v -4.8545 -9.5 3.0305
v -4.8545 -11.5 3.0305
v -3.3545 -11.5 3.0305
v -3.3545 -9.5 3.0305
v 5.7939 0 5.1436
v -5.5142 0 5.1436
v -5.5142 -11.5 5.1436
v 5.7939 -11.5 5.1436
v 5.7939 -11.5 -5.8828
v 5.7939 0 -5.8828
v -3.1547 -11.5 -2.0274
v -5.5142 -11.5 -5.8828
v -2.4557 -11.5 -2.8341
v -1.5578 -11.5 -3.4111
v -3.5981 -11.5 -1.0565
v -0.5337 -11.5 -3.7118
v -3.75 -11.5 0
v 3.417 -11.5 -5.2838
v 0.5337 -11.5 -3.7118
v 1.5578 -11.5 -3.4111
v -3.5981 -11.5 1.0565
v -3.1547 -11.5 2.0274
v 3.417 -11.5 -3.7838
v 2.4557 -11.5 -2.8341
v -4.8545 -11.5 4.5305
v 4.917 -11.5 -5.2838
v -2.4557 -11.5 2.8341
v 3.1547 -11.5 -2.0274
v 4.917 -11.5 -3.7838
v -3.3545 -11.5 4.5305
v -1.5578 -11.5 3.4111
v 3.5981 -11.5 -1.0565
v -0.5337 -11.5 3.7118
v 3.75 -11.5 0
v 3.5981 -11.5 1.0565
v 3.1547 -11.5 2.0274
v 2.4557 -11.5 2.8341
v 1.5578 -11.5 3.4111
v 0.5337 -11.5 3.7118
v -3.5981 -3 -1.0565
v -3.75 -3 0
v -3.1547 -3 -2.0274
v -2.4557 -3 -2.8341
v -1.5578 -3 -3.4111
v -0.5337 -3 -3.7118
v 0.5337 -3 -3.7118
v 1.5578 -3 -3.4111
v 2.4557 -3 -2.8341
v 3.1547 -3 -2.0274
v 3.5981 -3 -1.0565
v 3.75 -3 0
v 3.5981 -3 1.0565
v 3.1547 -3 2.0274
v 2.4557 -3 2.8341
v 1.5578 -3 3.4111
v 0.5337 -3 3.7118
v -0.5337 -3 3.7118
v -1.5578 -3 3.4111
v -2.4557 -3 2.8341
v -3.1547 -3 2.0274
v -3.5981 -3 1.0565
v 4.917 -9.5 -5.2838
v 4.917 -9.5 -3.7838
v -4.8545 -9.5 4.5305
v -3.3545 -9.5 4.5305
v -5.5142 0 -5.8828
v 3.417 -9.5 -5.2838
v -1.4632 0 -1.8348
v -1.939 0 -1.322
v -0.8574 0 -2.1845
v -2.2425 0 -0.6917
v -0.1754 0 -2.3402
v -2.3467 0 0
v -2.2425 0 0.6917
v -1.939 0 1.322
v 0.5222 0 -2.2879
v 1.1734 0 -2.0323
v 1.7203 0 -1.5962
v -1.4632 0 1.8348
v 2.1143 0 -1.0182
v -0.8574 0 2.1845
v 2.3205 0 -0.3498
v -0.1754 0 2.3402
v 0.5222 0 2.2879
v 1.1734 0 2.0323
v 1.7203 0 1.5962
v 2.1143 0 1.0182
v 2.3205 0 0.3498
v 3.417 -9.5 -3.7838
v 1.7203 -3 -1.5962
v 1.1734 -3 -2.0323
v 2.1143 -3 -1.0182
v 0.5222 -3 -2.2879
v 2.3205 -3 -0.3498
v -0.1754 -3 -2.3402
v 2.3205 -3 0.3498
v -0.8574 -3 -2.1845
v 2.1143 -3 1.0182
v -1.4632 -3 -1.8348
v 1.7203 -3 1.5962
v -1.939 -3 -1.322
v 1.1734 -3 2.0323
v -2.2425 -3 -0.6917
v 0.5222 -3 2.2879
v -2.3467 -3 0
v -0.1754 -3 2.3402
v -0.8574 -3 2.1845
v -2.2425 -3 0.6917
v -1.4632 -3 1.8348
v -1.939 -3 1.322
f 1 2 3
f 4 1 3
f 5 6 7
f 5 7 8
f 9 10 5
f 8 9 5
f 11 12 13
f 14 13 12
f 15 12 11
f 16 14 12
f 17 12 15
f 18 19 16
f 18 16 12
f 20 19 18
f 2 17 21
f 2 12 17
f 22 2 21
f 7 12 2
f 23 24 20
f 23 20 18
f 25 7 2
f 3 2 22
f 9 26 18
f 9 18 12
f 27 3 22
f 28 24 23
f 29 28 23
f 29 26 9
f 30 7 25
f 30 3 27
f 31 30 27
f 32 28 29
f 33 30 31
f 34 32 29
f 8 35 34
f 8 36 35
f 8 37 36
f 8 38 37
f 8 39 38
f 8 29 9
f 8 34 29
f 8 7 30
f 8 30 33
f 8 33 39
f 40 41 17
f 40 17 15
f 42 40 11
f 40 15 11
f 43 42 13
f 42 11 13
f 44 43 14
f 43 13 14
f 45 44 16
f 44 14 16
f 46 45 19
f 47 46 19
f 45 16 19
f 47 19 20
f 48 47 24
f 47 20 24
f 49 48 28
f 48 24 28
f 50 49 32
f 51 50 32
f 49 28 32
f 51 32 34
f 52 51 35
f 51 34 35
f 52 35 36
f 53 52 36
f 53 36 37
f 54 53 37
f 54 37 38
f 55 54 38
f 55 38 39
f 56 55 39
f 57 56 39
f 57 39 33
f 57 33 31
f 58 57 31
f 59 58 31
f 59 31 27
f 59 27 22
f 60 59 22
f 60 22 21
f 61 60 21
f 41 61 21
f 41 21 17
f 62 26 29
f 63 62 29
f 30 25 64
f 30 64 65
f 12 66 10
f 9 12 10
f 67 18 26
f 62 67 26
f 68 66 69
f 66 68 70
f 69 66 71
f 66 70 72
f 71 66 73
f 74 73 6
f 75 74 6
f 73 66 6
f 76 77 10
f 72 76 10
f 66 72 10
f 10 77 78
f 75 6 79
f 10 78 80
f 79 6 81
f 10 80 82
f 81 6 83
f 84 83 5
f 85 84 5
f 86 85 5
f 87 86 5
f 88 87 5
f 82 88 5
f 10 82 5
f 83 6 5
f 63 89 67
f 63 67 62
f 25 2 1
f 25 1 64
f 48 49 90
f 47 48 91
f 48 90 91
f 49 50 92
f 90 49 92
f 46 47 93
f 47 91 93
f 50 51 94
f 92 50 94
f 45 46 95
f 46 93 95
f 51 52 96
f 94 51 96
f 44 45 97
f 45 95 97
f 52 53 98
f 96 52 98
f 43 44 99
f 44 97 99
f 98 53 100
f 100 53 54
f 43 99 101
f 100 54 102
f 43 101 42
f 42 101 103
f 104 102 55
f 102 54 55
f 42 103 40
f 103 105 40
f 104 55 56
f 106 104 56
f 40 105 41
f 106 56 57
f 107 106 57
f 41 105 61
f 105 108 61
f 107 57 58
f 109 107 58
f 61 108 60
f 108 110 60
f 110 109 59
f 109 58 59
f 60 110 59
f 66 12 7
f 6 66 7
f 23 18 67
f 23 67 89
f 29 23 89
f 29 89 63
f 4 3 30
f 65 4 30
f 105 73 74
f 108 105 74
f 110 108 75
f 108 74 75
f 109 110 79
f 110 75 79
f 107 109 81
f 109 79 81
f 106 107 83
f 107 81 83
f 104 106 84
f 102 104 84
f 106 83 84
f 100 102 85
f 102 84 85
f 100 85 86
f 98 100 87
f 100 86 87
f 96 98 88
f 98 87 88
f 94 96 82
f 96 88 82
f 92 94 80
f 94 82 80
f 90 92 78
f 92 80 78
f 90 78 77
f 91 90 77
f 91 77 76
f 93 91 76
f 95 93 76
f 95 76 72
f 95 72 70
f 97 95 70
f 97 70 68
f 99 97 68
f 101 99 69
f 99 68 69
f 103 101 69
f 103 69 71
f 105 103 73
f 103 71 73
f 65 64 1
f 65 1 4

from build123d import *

# Parameters (mm, degrees)
F0_W      = 15.221721
F0_H      = 54.359732
F1_DEPTH  = 11.5
F3_D      = 7.5
F4_W      = 42.202285
F4_H      = 45.044836
F5_DEPTH  = 25
F6_W      = 6.489188
F6_H      = 15.716003
F7_DEPTH  = 14
F8_R      = 4.527333
F8_R_2    = 2.346749
F9_DEPTH  = 3
F10_W     = 1.5
F10_H     = 1.5
F11_DEPTH = 2


with BuildPart() as f1:
    # F0 (on Front) → F1 (new body)
    with BuildSketch(Plane.XZ):
        with Locations((-1.816982, -22.036255)):
            Rectangle(F0_W, F0_H)
    extrude(amount=F1_DEPTH)

    # F3 (through all)
    with Locations(Plane(origin=(0, 0, 0), x_dir=(1, 0, 0), z_dir=(0, 1, 0))):
        with Locations((0, 0)):
            Hole(F3_D / 2)

    # F4 (on Front) → F5 (cut)
    with BuildSketch(Plane.XZ):
        with Locations((0.021285, -28.405259)):
            Rectangle(F4_W, F4_H)
    extrude(amount=F5_DEPTH, mode=Mode.SUBTRACT)

    # F6 (on face) → F7 (cut)
    with BuildSketch(Plane.XZ.offset(11.5)):
        with Locations((-8.758753, -0.702533)):
            Rectangle(F6_W, F6_H)
    extrude(amount=-F7_DEPTH, mode=Mode.SUBTRACT)

    # F8 (on face) → F9 (join)
    with BuildSketch(Plane(origin=(0, 0, 0), x_dir=(-1, 0, 0), z_dir=(0, 1, 0))):
        Circle(F8_R)
        Circle(F8_R_2, mode=Mode.SUBTRACT)
    extrude(amount=-F9_DEPTH)

    # F10 (on face) → F11 (cut)
    with BuildSketch(Plane.XZ.offset(11.5)):
        with Locations((-4.104478, 3.780475)):
            Rectangle(F10_W, F10_H)
        with Locations((4.16695, -4.533809)):
            Rectangle(F10_W, F10_H)
    extrude(amount=-F11_DEPTH, mode=Mode.SUBTRACT)


solid = f1.part
